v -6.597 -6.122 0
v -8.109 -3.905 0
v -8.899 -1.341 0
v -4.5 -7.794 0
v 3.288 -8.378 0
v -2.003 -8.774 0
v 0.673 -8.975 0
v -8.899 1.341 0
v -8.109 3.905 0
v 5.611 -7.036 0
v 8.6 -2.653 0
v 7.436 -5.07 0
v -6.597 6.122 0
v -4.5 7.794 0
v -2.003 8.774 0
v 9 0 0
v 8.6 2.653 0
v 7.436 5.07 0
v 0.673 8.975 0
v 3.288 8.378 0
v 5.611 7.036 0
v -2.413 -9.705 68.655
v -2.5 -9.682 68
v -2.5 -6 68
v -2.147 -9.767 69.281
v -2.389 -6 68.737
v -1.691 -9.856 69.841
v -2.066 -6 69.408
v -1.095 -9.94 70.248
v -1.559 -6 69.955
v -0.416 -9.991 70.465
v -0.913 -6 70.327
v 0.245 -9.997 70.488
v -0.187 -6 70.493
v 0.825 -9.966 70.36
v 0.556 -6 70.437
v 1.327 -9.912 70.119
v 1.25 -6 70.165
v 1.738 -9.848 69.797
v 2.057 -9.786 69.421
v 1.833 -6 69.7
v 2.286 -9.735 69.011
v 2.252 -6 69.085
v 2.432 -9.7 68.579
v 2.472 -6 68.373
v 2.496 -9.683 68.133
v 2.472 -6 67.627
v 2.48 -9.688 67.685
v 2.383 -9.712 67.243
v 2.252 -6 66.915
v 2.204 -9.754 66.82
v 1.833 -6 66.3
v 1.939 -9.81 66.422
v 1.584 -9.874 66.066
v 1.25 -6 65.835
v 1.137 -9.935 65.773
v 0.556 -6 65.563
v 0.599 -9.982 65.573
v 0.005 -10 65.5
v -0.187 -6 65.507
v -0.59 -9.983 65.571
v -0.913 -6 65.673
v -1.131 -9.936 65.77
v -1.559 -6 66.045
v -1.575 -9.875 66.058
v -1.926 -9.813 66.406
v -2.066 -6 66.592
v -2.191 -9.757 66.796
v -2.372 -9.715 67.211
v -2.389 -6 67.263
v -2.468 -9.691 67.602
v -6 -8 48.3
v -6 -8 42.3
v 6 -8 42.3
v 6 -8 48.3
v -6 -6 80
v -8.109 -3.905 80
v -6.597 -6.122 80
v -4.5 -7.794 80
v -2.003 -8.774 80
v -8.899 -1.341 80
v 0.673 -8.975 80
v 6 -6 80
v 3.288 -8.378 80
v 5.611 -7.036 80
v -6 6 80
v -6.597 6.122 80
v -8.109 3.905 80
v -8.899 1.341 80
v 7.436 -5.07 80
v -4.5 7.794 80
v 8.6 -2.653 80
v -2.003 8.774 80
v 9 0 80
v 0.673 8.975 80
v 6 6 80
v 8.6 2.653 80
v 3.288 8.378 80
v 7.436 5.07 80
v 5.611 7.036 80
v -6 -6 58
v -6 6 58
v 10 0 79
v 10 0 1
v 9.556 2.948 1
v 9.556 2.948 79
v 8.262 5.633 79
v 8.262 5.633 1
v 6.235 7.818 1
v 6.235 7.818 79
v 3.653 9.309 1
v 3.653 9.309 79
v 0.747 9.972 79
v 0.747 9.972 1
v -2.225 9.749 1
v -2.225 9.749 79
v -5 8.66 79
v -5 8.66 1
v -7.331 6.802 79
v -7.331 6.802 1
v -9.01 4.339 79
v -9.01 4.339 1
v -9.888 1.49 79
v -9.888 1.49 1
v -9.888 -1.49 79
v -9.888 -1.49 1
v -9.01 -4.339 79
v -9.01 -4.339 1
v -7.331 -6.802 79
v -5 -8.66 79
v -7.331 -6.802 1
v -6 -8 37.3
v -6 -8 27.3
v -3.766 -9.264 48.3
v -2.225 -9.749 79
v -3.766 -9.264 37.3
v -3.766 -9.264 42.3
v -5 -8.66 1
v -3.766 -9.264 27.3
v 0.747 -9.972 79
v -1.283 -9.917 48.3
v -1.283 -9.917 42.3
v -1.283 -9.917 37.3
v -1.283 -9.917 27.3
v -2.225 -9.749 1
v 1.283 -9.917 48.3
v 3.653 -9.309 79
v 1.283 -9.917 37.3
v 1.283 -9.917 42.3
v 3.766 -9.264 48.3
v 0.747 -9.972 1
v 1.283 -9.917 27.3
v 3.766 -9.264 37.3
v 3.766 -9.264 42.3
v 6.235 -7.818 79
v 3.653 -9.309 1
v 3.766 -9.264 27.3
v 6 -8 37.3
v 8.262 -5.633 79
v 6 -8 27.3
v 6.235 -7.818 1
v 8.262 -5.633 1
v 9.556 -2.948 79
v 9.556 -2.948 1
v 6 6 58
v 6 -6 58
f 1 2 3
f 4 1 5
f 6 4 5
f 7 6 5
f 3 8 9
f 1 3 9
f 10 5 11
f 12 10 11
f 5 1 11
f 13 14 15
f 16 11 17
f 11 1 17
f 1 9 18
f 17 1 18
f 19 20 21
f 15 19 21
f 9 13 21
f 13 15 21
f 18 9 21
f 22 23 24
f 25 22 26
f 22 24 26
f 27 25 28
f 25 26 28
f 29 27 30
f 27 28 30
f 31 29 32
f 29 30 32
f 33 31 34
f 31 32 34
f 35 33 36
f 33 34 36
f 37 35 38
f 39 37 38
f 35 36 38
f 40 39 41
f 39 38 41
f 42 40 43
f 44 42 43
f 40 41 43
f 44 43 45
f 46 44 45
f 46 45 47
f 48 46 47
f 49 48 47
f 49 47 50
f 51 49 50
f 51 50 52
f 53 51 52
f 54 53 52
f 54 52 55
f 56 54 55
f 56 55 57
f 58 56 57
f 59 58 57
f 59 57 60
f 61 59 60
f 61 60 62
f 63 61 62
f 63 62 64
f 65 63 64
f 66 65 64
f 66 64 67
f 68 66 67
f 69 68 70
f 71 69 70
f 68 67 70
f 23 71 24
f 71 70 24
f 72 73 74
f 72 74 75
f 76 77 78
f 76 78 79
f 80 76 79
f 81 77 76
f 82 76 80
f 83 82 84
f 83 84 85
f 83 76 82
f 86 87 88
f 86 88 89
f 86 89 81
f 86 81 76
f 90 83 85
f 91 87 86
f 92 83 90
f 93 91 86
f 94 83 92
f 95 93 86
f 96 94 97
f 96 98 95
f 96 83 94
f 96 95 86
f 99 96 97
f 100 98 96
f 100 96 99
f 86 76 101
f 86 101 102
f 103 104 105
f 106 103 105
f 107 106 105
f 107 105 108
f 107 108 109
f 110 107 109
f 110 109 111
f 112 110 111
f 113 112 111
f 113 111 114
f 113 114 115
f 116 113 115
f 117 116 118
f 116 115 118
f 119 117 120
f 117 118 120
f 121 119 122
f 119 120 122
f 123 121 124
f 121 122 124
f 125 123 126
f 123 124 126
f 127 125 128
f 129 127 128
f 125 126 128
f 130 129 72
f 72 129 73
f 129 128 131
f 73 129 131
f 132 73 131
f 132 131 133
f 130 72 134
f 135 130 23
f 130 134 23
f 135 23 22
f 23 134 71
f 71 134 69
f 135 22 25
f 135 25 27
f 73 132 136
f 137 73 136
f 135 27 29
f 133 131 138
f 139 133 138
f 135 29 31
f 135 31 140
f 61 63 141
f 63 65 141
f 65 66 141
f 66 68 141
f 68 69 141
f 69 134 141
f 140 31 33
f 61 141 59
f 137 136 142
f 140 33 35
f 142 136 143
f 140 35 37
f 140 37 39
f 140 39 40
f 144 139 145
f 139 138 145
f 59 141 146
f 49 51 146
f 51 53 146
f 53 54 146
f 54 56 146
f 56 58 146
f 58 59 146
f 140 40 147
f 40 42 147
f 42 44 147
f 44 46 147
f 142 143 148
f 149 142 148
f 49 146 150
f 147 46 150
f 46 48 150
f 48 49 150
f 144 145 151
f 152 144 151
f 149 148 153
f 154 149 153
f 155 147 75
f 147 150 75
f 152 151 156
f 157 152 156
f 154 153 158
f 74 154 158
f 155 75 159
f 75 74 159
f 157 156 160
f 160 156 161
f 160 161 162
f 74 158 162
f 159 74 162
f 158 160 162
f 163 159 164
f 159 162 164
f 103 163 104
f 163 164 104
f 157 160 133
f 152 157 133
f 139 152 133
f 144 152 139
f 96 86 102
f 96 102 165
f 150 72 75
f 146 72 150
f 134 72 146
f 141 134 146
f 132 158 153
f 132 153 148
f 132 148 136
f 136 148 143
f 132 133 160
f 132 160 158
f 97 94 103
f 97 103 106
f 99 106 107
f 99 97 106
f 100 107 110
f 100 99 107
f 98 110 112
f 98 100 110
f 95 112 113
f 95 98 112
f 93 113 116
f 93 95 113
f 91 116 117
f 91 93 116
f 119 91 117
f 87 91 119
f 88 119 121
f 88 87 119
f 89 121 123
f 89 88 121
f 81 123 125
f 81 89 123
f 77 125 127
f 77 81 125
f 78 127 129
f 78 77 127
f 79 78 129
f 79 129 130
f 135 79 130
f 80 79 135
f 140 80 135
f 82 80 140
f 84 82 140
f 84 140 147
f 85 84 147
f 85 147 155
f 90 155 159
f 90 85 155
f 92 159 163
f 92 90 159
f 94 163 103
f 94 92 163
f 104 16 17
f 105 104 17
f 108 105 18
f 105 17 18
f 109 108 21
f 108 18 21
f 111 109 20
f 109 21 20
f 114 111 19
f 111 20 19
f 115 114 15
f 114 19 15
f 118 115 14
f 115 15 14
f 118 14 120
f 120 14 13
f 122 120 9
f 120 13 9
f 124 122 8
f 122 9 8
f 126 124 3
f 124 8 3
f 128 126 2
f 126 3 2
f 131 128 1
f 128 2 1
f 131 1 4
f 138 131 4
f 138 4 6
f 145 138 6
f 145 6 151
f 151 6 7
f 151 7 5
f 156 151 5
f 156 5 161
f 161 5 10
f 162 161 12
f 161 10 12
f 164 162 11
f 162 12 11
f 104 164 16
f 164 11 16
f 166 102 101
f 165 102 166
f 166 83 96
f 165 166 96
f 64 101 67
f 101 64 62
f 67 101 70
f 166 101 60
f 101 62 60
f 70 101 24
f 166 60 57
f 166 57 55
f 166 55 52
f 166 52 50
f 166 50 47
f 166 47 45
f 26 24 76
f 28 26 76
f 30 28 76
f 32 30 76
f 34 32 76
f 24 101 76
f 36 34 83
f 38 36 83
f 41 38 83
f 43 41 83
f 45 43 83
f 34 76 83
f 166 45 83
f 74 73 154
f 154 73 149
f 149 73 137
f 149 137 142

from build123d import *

# Parameters (mm, degrees)
F0_R     = 10
F1_DEPTH = 80
F2_W     = 12
F2_H     = 12
F3_DEPTH = 22
F6_D     = 5
F6_DEPTH = 12
F7_W     = 4
F7_H     = 6
F7_H_2   = 10
F8_DEPTH = 12.5
F9_SIZE  = 1


with BuildPart() as f1:
    # F0 (on Top) → F1 (new body)
    with BuildSketch(Plane.XY):
        Circle(F0_R)
    extrude(amount=F1_DEPTH)

    # F2 (on face) → F3 (cut)
    with BuildSketch(Plane.XY.offset(80)):
        Rectangle(F2_W, F2_H)
    extrude(amount=-F3_DEPTH, mode=Mode.SUBTRACT)

    # F6
    with Locations(Plane.XZ.offset(10)):
        with Locations((0, 68)):
            Hole(F6_D / 2, depth=F6_DEPTH)

    # F7 (on Right) → F8 (cut, symmetric)
    with BuildSketch(Plane.YZ):
        with Locations((-10, 45.3)):
            Rectangle(F7_W, F7_H)
        with Locations((-10, 32.3)):
            Rectangle(F7_W, F7_H_2)
    extrude(amount=F8_DEPTH, both=True, mode=Mode.SUBTRACT)

    # F9
    f9_edges = [f1.edges().sort_by_distance(p)[0] for p in [
        (-10, 0, 80),
        (-10, 0, 0),
    ]]
    chamfer(f9_edges, length=F9_SIZE)


solid = f1.part
